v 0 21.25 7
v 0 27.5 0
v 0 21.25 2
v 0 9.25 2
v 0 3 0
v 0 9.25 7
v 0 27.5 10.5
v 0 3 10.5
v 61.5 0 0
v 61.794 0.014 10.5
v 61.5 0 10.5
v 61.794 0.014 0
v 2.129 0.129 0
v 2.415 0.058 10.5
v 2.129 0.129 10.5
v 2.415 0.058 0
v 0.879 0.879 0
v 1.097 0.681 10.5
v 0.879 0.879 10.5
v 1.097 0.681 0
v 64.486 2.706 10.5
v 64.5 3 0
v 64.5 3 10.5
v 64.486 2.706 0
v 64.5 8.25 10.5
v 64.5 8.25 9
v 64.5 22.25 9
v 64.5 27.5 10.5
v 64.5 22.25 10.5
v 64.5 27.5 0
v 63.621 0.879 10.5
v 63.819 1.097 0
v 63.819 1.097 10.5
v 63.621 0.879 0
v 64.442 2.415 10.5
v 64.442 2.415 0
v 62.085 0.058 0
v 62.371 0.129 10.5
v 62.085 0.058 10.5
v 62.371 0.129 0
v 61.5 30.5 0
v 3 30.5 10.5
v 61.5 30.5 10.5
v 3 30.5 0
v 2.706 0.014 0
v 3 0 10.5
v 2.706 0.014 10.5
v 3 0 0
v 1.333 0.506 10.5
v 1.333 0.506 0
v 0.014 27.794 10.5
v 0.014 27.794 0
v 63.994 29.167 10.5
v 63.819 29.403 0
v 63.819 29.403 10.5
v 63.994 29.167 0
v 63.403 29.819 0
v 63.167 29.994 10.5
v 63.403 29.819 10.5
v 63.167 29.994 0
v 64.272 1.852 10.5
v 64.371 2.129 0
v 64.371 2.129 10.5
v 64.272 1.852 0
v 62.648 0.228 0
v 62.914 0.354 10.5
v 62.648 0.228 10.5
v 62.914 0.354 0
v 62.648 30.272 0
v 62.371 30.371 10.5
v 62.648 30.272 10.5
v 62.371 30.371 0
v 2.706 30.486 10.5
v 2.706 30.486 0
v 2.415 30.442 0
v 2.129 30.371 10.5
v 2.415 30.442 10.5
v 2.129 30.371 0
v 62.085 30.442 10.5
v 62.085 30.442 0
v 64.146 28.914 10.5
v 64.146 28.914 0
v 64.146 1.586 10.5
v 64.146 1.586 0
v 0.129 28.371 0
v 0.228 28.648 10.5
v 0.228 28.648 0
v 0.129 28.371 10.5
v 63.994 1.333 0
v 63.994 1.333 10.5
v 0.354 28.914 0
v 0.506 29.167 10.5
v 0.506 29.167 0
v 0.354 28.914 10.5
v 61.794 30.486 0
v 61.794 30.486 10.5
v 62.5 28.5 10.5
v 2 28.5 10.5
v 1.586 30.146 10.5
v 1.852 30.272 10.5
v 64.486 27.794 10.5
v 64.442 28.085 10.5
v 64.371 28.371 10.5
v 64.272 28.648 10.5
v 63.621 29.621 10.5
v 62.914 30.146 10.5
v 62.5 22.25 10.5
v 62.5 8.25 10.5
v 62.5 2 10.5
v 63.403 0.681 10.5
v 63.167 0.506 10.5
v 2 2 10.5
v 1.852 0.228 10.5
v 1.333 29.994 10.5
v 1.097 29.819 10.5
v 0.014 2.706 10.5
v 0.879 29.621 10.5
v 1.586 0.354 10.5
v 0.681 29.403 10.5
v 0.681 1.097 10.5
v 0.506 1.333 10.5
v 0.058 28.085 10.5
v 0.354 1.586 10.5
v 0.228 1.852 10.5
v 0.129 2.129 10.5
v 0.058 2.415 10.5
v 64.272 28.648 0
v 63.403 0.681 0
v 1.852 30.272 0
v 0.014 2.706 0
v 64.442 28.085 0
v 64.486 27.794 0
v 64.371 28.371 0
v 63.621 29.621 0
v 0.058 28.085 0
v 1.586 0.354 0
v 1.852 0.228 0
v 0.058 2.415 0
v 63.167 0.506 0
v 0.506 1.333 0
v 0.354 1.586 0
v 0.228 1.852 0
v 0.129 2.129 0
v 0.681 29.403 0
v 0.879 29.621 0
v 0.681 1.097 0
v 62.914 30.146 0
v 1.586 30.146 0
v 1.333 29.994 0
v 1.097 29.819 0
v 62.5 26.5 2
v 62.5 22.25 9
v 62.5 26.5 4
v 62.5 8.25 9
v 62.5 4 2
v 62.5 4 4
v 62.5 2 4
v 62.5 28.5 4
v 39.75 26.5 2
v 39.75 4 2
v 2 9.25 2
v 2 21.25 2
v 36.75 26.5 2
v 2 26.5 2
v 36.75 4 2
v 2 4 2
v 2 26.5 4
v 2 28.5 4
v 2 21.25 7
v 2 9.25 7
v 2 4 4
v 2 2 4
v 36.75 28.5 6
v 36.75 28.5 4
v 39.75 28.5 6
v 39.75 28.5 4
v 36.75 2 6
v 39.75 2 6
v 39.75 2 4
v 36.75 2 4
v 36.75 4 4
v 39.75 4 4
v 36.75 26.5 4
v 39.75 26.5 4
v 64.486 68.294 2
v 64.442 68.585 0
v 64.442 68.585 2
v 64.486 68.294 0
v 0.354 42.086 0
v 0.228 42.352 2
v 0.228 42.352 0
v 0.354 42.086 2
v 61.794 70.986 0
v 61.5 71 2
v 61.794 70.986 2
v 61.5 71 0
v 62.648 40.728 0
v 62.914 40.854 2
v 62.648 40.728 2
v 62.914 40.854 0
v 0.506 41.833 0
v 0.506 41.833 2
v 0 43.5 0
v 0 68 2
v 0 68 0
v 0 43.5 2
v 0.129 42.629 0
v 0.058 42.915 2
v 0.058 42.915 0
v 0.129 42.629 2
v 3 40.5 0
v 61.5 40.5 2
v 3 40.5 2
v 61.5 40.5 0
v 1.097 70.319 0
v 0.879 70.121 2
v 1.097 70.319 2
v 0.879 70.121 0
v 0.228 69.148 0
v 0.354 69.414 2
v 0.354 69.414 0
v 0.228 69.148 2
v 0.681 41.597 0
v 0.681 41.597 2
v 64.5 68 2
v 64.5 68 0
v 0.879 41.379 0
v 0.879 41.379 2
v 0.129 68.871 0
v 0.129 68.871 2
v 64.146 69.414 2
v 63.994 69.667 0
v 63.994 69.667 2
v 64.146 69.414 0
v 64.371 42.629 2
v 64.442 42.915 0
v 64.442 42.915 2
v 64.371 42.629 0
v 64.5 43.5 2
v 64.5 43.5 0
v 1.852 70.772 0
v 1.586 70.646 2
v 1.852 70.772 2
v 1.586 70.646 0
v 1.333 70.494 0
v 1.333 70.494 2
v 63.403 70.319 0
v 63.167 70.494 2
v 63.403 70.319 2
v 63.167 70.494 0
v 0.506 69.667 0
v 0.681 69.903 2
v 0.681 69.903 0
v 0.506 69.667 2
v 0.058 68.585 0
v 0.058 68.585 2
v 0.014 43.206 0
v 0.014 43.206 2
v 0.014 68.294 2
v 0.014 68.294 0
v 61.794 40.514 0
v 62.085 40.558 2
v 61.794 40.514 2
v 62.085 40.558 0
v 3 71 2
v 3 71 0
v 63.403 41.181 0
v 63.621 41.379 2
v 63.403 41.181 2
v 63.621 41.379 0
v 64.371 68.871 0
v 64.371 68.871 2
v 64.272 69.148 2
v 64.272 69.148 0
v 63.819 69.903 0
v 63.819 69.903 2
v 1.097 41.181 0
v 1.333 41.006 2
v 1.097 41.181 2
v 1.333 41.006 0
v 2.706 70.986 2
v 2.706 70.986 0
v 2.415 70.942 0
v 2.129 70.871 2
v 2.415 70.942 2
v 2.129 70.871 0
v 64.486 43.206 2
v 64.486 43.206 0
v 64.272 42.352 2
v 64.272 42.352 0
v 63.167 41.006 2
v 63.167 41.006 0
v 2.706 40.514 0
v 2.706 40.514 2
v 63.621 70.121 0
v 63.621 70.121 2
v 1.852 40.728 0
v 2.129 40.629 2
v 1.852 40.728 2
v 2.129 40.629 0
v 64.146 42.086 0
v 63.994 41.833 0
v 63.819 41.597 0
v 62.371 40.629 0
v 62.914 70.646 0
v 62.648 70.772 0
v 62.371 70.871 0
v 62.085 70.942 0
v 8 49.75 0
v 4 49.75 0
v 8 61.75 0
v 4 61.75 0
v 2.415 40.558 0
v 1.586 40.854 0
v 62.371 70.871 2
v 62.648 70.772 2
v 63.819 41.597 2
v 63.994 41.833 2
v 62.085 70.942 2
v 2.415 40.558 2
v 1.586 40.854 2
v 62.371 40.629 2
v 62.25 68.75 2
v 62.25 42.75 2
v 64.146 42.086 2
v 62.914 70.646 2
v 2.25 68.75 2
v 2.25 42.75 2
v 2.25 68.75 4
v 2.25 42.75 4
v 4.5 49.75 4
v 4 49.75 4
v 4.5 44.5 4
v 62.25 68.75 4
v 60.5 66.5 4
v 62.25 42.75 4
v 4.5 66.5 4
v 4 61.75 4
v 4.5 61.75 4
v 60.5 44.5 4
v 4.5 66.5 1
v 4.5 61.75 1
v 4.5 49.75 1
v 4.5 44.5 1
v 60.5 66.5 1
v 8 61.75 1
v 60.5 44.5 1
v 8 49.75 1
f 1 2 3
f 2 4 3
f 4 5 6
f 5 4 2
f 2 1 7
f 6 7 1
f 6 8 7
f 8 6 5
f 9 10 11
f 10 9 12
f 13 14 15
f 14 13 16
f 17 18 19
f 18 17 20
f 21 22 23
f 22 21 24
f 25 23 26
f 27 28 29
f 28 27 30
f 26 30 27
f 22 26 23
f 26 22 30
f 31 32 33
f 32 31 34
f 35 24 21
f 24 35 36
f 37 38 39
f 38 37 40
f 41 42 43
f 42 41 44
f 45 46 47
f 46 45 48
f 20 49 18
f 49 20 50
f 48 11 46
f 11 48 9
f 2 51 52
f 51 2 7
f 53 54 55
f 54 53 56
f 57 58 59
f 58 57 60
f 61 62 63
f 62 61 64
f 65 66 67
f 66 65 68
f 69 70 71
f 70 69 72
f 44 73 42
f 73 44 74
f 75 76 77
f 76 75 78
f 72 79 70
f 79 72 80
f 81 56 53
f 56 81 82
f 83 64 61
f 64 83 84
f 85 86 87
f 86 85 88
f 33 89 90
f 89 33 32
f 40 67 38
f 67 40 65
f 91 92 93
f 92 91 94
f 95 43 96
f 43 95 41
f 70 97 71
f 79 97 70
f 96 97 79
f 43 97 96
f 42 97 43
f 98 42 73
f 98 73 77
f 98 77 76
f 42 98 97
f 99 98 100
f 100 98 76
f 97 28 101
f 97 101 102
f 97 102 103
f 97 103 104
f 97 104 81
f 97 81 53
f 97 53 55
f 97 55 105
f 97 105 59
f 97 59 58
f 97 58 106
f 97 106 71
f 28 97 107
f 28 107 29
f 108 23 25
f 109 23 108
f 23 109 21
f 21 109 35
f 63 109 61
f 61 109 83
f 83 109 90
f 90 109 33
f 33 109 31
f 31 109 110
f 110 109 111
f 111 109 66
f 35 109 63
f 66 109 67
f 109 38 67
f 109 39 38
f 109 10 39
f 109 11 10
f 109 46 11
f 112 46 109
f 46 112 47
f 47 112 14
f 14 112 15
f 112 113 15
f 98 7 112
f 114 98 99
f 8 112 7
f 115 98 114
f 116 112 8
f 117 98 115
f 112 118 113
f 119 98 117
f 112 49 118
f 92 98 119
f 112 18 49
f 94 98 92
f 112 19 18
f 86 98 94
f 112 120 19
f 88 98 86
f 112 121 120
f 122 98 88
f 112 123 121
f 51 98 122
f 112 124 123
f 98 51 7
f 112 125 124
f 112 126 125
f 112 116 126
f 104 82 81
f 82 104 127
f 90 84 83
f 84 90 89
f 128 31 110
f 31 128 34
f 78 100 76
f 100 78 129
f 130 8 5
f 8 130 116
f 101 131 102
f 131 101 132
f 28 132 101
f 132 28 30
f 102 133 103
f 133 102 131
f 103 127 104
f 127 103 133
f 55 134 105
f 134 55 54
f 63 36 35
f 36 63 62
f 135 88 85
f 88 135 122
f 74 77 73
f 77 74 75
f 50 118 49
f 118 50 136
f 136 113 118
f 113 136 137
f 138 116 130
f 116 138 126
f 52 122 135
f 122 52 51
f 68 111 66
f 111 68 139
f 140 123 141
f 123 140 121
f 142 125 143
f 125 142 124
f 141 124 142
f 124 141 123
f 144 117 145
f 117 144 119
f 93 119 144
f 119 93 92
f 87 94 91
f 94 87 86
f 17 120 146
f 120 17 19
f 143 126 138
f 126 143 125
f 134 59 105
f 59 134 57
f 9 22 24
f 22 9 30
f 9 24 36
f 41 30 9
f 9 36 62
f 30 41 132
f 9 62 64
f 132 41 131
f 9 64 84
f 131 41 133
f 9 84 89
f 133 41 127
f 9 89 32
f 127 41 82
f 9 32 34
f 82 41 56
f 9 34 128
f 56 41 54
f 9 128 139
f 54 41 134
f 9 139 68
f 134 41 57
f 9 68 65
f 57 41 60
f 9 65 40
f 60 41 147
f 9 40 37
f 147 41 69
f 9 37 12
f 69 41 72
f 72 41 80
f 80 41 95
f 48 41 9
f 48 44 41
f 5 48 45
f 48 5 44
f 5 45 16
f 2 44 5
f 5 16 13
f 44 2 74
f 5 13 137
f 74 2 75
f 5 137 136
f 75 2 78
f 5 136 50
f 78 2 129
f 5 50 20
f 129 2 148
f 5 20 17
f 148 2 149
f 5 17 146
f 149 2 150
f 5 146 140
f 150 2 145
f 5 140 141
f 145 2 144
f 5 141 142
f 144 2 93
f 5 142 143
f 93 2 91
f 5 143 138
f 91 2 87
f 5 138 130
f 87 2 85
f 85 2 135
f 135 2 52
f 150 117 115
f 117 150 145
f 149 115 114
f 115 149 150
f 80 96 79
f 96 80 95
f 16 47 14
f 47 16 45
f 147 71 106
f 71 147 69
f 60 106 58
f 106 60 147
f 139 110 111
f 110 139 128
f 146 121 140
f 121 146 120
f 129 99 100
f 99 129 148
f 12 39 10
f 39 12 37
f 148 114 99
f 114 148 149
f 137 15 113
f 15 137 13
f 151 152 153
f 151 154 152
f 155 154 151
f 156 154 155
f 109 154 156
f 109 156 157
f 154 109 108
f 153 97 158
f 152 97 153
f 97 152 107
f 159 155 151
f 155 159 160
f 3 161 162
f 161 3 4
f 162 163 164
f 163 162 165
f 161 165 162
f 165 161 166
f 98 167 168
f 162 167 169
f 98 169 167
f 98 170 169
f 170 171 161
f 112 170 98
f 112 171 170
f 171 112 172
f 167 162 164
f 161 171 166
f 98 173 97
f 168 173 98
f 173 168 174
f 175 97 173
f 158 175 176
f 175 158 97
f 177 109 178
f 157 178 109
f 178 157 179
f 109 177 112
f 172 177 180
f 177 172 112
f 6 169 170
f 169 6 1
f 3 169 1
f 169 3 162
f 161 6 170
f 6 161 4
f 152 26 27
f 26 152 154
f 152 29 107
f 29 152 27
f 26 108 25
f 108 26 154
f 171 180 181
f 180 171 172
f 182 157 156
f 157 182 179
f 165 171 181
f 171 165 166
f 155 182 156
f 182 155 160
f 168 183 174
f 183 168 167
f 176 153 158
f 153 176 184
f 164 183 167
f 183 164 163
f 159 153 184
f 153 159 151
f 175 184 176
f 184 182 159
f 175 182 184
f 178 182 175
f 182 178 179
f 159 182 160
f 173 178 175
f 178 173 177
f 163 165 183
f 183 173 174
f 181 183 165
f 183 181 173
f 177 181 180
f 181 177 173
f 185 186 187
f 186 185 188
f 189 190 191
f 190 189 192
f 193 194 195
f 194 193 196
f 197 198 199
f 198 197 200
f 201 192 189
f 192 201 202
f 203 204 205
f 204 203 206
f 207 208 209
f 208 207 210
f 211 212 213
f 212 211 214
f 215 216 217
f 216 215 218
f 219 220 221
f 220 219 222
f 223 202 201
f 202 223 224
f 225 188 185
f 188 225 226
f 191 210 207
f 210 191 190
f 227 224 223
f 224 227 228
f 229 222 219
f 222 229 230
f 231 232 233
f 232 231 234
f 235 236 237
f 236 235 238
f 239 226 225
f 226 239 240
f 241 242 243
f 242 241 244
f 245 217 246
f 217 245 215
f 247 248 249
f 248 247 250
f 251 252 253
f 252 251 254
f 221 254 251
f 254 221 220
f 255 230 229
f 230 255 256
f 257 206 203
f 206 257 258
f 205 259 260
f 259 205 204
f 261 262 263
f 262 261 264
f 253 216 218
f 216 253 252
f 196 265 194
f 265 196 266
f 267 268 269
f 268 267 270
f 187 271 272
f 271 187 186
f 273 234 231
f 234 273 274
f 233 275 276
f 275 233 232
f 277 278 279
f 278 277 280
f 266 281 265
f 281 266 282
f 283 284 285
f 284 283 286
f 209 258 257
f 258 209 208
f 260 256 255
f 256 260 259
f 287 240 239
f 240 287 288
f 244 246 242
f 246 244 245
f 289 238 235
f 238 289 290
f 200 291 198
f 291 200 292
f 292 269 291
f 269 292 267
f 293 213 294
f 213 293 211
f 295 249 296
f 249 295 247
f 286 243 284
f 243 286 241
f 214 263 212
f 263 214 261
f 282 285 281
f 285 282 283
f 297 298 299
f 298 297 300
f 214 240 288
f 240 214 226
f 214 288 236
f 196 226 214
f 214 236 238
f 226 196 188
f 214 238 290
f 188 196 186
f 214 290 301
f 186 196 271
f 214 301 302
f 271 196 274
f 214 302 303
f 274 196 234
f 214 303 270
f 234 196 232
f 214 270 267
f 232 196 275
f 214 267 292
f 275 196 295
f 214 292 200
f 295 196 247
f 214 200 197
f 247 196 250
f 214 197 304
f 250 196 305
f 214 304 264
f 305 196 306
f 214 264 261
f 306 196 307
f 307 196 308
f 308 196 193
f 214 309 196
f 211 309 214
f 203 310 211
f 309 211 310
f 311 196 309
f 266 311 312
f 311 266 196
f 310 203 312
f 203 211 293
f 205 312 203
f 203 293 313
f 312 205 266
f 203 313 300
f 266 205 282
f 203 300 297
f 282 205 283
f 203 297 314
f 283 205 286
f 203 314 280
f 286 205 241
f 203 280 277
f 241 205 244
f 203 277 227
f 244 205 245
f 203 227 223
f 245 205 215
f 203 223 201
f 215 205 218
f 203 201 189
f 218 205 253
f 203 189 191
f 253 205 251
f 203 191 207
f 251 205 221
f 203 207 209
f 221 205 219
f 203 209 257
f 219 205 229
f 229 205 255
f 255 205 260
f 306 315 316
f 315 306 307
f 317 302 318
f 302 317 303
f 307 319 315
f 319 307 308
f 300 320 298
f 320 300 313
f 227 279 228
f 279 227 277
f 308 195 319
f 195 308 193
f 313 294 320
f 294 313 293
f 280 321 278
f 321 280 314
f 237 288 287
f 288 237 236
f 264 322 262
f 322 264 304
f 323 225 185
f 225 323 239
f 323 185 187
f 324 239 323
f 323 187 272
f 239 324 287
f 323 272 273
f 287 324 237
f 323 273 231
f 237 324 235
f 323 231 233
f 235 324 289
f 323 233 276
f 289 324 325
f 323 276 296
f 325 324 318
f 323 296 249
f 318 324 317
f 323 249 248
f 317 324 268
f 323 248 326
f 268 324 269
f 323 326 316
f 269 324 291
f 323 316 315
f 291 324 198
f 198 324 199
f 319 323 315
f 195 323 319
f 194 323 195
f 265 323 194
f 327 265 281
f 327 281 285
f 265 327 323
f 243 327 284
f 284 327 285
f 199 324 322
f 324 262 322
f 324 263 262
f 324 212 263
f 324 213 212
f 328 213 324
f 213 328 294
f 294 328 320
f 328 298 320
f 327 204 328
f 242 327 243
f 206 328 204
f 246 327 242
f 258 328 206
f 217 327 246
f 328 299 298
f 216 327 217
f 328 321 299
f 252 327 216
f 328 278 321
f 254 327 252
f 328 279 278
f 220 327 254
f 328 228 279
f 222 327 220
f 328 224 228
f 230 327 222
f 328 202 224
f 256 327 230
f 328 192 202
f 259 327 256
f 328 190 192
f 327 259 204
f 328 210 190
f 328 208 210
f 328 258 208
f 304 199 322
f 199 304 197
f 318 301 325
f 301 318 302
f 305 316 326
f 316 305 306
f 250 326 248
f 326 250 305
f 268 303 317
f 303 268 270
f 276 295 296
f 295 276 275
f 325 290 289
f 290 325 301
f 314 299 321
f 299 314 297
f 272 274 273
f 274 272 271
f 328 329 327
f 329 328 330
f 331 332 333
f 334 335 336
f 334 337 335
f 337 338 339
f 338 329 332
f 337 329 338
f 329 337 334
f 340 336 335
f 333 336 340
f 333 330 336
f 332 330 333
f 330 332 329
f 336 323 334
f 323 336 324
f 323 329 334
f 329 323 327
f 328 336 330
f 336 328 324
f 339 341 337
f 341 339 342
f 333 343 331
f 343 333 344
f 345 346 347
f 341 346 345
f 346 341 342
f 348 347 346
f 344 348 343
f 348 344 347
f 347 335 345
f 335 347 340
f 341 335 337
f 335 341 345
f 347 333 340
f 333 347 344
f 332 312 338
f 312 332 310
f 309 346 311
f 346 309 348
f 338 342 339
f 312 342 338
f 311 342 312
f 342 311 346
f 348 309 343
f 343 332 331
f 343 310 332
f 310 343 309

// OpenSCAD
// --- sélecteur d'affichage pour l'impression ---
// 1 = base du boîtier seul, 2 = couvercle seul, 3 = les deux pièces
choix_piece = 3; 

// --- paramètres du boîtier (adaptés pour wemos d1 + clavier long) ---
longueur_interne = 60;   // maintenu à 60 pour accueillir le clavier de 57mm
largeur_interne  = 26;   // 25.5mm + jeu
hauteur_interne  = 8.5;  // 7mm + jeu pour les soudures/composants sous la carte
epaisseur_paroi  = 2;
jeu              = 0.5; 
rayon_boitier    = 3;   

// --- paramètres de la barre de stop (butée pour bloquer le wemos d1) ---
wemos_longueur   = 34.5;
stop_largeur     = 3;   // épaisseur de la barre de stop
stop_hauteur     = 4;   // hauteur de la barre pour bloquer le pcb sans toucher les puces

// --- paramètres des bandes latérales internes (bords gauche et droit) ---
bande_largeur   = 2; 
bande_epaisseur = 2; 

// --- paramètres de la découpe du clavier ---
clavier_longueur = 0;
clavier_largeur  = 00;
clavier_epaisseur= 0; 

// --- calculs des dimensions externes ---
longueur_externe = longueur_interne + (2 * epaisseur_paroi) + jeu;
largeur_externe  = largeur_interne + (2 * epaisseur_paroi) + jeu;
hauteur_boite    = hauteur_interne + epaisseur_paroi;

$fn = 64; 

// --- logique d'affichage ---
if (choix_piece == 1) {
    base_boitier();
}
else if (choix_piece == 2) {
    translate([0, 0, epaisseur_paroi]) 
        rotate([0, 180, 0]) 
        couvercle();
}
else if (choix_piece == 3) {
    translate([0, 0, 0]) base_boitier();
    
    translate([longueur_externe, largeur_externe + 10, epaisseur_paroi]) 
        rotate([0, 180, 0]) 
        couvercle();
}

// --- module d'aide : cube avec coins verticaux arrondis ---
module cube_arrondi(x, y, z, r) {
    translate([r, r, 0])
    minkowski() {
        cube([x - 2*r, y - 2*r, z - 0.1]);
        cylinder(r = r, h = 0.1);
    }
}

// --- module : base du boîtier ---
module base_boitier() {
    difference() {
        // volume externe de la boîte avec coins arrondis
        cube_arrondi(longueur_externe, largeur_externe, hauteur_boite, rayon_boitier);
        
        // évidement interne principal
        translate([epaisseur_paroi, epaisseur_paroi, epaisseur_paroi])
            cube([longueur_interne + jeu, largeur_interne + jeu, hauteur_boite]);
        
        // ouverture frontale pour le port micro-usb / usb-c du wemos d1
        translate([-1, (largeur_externe / 2) - 6, epaisseur_paroi])
            cube([epaisseur_paroi + 2, 12, 5]);
        
        // fente à l'arrière pour faire passer la nappe plate du clavier
        translate([longueur_externe - epaisseur_paroi - 1, (largeur_externe / 2) - 7, hauteur_boite - 1.5])
            cube([epaisseur_paroi + 2, 14, 2]);
    }
    
    // bandes latérales de soutien (gauche et droite)
    translate([epaisseur_paroi, epaisseur_paroi, epaisseur_paroi])
        cube([longueur_interne + jeu, bande_largeur, bande_epaisseur]);
        
    translate([epaisseur_paroi, largeur_externe - epaisseur_paroi - bande_largeur, epaisseur_paroi])
        cube([longueur_interne + jeu, bande_largeur, bande_epaisseur]);

    // barre de stop transversale pour bloquer le wemos d1 à la longueur exacte
    // positionnée juste après la longueur du wemos pour l'empêcher de reculer
    translate([epaisseur_paroi + wemos_longueur + (jeu/2), epaisseur_paroi, epaisseur_paroi])
        cube([stop_largeur, largeur_interne + jeu, stop_hauteur]);
}

// --- module : couvercle avec emplacement clavier ---
module couvercle() {
    difference() {
        union() {
            // plaque supérieure externe du couvercle avec coins arrondis
            cube_arrondi(longueur_externe, largeur_externe, epaisseur_paroi, rayon_boitier);
            
            // lèvre interne pour emboîter le couvercle
            translate([epaisseur_paroi + (jeu/2), epaisseur_paroi + (jeu/2), -epaisseur_paroi])
                cube([longueur_interne, largeur_interne, epaisseur_paroi]);
        }
        
        // évidement interne de la lèvre
        translate([epaisseur_paroi * 2, epaisseur_paroi * 2, -epaisseur_paroi - 1])
            cube([longueur_interne - (epaisseur_paroi * 2), largeur_interne - (epaisseur_paroi * 2), epaisseur_paroi + 2]);
            
        // renfoncement sur le dessus pour intégrer le clavier (réactivé à 57x20mm)
        translate([(longueur_externe - clavier_longueur) / 2, (largeur_externe - clavier_largeur) / 2, epaisseur_paroi - clavier_epaisseur])
            cube([clavier_longueur, clavier_largeur, clavier_epaisseur + 1]);
            
        // fente débouchante pour glisser la nappe à l'intérieur
        translate([longueur_externe - epaisseur_paroi - 6, (largeur_externe - 12) / 2, -epaisseur_paroi - 2])
            cube([4, 12, hauteur_boite]);
    }
}
